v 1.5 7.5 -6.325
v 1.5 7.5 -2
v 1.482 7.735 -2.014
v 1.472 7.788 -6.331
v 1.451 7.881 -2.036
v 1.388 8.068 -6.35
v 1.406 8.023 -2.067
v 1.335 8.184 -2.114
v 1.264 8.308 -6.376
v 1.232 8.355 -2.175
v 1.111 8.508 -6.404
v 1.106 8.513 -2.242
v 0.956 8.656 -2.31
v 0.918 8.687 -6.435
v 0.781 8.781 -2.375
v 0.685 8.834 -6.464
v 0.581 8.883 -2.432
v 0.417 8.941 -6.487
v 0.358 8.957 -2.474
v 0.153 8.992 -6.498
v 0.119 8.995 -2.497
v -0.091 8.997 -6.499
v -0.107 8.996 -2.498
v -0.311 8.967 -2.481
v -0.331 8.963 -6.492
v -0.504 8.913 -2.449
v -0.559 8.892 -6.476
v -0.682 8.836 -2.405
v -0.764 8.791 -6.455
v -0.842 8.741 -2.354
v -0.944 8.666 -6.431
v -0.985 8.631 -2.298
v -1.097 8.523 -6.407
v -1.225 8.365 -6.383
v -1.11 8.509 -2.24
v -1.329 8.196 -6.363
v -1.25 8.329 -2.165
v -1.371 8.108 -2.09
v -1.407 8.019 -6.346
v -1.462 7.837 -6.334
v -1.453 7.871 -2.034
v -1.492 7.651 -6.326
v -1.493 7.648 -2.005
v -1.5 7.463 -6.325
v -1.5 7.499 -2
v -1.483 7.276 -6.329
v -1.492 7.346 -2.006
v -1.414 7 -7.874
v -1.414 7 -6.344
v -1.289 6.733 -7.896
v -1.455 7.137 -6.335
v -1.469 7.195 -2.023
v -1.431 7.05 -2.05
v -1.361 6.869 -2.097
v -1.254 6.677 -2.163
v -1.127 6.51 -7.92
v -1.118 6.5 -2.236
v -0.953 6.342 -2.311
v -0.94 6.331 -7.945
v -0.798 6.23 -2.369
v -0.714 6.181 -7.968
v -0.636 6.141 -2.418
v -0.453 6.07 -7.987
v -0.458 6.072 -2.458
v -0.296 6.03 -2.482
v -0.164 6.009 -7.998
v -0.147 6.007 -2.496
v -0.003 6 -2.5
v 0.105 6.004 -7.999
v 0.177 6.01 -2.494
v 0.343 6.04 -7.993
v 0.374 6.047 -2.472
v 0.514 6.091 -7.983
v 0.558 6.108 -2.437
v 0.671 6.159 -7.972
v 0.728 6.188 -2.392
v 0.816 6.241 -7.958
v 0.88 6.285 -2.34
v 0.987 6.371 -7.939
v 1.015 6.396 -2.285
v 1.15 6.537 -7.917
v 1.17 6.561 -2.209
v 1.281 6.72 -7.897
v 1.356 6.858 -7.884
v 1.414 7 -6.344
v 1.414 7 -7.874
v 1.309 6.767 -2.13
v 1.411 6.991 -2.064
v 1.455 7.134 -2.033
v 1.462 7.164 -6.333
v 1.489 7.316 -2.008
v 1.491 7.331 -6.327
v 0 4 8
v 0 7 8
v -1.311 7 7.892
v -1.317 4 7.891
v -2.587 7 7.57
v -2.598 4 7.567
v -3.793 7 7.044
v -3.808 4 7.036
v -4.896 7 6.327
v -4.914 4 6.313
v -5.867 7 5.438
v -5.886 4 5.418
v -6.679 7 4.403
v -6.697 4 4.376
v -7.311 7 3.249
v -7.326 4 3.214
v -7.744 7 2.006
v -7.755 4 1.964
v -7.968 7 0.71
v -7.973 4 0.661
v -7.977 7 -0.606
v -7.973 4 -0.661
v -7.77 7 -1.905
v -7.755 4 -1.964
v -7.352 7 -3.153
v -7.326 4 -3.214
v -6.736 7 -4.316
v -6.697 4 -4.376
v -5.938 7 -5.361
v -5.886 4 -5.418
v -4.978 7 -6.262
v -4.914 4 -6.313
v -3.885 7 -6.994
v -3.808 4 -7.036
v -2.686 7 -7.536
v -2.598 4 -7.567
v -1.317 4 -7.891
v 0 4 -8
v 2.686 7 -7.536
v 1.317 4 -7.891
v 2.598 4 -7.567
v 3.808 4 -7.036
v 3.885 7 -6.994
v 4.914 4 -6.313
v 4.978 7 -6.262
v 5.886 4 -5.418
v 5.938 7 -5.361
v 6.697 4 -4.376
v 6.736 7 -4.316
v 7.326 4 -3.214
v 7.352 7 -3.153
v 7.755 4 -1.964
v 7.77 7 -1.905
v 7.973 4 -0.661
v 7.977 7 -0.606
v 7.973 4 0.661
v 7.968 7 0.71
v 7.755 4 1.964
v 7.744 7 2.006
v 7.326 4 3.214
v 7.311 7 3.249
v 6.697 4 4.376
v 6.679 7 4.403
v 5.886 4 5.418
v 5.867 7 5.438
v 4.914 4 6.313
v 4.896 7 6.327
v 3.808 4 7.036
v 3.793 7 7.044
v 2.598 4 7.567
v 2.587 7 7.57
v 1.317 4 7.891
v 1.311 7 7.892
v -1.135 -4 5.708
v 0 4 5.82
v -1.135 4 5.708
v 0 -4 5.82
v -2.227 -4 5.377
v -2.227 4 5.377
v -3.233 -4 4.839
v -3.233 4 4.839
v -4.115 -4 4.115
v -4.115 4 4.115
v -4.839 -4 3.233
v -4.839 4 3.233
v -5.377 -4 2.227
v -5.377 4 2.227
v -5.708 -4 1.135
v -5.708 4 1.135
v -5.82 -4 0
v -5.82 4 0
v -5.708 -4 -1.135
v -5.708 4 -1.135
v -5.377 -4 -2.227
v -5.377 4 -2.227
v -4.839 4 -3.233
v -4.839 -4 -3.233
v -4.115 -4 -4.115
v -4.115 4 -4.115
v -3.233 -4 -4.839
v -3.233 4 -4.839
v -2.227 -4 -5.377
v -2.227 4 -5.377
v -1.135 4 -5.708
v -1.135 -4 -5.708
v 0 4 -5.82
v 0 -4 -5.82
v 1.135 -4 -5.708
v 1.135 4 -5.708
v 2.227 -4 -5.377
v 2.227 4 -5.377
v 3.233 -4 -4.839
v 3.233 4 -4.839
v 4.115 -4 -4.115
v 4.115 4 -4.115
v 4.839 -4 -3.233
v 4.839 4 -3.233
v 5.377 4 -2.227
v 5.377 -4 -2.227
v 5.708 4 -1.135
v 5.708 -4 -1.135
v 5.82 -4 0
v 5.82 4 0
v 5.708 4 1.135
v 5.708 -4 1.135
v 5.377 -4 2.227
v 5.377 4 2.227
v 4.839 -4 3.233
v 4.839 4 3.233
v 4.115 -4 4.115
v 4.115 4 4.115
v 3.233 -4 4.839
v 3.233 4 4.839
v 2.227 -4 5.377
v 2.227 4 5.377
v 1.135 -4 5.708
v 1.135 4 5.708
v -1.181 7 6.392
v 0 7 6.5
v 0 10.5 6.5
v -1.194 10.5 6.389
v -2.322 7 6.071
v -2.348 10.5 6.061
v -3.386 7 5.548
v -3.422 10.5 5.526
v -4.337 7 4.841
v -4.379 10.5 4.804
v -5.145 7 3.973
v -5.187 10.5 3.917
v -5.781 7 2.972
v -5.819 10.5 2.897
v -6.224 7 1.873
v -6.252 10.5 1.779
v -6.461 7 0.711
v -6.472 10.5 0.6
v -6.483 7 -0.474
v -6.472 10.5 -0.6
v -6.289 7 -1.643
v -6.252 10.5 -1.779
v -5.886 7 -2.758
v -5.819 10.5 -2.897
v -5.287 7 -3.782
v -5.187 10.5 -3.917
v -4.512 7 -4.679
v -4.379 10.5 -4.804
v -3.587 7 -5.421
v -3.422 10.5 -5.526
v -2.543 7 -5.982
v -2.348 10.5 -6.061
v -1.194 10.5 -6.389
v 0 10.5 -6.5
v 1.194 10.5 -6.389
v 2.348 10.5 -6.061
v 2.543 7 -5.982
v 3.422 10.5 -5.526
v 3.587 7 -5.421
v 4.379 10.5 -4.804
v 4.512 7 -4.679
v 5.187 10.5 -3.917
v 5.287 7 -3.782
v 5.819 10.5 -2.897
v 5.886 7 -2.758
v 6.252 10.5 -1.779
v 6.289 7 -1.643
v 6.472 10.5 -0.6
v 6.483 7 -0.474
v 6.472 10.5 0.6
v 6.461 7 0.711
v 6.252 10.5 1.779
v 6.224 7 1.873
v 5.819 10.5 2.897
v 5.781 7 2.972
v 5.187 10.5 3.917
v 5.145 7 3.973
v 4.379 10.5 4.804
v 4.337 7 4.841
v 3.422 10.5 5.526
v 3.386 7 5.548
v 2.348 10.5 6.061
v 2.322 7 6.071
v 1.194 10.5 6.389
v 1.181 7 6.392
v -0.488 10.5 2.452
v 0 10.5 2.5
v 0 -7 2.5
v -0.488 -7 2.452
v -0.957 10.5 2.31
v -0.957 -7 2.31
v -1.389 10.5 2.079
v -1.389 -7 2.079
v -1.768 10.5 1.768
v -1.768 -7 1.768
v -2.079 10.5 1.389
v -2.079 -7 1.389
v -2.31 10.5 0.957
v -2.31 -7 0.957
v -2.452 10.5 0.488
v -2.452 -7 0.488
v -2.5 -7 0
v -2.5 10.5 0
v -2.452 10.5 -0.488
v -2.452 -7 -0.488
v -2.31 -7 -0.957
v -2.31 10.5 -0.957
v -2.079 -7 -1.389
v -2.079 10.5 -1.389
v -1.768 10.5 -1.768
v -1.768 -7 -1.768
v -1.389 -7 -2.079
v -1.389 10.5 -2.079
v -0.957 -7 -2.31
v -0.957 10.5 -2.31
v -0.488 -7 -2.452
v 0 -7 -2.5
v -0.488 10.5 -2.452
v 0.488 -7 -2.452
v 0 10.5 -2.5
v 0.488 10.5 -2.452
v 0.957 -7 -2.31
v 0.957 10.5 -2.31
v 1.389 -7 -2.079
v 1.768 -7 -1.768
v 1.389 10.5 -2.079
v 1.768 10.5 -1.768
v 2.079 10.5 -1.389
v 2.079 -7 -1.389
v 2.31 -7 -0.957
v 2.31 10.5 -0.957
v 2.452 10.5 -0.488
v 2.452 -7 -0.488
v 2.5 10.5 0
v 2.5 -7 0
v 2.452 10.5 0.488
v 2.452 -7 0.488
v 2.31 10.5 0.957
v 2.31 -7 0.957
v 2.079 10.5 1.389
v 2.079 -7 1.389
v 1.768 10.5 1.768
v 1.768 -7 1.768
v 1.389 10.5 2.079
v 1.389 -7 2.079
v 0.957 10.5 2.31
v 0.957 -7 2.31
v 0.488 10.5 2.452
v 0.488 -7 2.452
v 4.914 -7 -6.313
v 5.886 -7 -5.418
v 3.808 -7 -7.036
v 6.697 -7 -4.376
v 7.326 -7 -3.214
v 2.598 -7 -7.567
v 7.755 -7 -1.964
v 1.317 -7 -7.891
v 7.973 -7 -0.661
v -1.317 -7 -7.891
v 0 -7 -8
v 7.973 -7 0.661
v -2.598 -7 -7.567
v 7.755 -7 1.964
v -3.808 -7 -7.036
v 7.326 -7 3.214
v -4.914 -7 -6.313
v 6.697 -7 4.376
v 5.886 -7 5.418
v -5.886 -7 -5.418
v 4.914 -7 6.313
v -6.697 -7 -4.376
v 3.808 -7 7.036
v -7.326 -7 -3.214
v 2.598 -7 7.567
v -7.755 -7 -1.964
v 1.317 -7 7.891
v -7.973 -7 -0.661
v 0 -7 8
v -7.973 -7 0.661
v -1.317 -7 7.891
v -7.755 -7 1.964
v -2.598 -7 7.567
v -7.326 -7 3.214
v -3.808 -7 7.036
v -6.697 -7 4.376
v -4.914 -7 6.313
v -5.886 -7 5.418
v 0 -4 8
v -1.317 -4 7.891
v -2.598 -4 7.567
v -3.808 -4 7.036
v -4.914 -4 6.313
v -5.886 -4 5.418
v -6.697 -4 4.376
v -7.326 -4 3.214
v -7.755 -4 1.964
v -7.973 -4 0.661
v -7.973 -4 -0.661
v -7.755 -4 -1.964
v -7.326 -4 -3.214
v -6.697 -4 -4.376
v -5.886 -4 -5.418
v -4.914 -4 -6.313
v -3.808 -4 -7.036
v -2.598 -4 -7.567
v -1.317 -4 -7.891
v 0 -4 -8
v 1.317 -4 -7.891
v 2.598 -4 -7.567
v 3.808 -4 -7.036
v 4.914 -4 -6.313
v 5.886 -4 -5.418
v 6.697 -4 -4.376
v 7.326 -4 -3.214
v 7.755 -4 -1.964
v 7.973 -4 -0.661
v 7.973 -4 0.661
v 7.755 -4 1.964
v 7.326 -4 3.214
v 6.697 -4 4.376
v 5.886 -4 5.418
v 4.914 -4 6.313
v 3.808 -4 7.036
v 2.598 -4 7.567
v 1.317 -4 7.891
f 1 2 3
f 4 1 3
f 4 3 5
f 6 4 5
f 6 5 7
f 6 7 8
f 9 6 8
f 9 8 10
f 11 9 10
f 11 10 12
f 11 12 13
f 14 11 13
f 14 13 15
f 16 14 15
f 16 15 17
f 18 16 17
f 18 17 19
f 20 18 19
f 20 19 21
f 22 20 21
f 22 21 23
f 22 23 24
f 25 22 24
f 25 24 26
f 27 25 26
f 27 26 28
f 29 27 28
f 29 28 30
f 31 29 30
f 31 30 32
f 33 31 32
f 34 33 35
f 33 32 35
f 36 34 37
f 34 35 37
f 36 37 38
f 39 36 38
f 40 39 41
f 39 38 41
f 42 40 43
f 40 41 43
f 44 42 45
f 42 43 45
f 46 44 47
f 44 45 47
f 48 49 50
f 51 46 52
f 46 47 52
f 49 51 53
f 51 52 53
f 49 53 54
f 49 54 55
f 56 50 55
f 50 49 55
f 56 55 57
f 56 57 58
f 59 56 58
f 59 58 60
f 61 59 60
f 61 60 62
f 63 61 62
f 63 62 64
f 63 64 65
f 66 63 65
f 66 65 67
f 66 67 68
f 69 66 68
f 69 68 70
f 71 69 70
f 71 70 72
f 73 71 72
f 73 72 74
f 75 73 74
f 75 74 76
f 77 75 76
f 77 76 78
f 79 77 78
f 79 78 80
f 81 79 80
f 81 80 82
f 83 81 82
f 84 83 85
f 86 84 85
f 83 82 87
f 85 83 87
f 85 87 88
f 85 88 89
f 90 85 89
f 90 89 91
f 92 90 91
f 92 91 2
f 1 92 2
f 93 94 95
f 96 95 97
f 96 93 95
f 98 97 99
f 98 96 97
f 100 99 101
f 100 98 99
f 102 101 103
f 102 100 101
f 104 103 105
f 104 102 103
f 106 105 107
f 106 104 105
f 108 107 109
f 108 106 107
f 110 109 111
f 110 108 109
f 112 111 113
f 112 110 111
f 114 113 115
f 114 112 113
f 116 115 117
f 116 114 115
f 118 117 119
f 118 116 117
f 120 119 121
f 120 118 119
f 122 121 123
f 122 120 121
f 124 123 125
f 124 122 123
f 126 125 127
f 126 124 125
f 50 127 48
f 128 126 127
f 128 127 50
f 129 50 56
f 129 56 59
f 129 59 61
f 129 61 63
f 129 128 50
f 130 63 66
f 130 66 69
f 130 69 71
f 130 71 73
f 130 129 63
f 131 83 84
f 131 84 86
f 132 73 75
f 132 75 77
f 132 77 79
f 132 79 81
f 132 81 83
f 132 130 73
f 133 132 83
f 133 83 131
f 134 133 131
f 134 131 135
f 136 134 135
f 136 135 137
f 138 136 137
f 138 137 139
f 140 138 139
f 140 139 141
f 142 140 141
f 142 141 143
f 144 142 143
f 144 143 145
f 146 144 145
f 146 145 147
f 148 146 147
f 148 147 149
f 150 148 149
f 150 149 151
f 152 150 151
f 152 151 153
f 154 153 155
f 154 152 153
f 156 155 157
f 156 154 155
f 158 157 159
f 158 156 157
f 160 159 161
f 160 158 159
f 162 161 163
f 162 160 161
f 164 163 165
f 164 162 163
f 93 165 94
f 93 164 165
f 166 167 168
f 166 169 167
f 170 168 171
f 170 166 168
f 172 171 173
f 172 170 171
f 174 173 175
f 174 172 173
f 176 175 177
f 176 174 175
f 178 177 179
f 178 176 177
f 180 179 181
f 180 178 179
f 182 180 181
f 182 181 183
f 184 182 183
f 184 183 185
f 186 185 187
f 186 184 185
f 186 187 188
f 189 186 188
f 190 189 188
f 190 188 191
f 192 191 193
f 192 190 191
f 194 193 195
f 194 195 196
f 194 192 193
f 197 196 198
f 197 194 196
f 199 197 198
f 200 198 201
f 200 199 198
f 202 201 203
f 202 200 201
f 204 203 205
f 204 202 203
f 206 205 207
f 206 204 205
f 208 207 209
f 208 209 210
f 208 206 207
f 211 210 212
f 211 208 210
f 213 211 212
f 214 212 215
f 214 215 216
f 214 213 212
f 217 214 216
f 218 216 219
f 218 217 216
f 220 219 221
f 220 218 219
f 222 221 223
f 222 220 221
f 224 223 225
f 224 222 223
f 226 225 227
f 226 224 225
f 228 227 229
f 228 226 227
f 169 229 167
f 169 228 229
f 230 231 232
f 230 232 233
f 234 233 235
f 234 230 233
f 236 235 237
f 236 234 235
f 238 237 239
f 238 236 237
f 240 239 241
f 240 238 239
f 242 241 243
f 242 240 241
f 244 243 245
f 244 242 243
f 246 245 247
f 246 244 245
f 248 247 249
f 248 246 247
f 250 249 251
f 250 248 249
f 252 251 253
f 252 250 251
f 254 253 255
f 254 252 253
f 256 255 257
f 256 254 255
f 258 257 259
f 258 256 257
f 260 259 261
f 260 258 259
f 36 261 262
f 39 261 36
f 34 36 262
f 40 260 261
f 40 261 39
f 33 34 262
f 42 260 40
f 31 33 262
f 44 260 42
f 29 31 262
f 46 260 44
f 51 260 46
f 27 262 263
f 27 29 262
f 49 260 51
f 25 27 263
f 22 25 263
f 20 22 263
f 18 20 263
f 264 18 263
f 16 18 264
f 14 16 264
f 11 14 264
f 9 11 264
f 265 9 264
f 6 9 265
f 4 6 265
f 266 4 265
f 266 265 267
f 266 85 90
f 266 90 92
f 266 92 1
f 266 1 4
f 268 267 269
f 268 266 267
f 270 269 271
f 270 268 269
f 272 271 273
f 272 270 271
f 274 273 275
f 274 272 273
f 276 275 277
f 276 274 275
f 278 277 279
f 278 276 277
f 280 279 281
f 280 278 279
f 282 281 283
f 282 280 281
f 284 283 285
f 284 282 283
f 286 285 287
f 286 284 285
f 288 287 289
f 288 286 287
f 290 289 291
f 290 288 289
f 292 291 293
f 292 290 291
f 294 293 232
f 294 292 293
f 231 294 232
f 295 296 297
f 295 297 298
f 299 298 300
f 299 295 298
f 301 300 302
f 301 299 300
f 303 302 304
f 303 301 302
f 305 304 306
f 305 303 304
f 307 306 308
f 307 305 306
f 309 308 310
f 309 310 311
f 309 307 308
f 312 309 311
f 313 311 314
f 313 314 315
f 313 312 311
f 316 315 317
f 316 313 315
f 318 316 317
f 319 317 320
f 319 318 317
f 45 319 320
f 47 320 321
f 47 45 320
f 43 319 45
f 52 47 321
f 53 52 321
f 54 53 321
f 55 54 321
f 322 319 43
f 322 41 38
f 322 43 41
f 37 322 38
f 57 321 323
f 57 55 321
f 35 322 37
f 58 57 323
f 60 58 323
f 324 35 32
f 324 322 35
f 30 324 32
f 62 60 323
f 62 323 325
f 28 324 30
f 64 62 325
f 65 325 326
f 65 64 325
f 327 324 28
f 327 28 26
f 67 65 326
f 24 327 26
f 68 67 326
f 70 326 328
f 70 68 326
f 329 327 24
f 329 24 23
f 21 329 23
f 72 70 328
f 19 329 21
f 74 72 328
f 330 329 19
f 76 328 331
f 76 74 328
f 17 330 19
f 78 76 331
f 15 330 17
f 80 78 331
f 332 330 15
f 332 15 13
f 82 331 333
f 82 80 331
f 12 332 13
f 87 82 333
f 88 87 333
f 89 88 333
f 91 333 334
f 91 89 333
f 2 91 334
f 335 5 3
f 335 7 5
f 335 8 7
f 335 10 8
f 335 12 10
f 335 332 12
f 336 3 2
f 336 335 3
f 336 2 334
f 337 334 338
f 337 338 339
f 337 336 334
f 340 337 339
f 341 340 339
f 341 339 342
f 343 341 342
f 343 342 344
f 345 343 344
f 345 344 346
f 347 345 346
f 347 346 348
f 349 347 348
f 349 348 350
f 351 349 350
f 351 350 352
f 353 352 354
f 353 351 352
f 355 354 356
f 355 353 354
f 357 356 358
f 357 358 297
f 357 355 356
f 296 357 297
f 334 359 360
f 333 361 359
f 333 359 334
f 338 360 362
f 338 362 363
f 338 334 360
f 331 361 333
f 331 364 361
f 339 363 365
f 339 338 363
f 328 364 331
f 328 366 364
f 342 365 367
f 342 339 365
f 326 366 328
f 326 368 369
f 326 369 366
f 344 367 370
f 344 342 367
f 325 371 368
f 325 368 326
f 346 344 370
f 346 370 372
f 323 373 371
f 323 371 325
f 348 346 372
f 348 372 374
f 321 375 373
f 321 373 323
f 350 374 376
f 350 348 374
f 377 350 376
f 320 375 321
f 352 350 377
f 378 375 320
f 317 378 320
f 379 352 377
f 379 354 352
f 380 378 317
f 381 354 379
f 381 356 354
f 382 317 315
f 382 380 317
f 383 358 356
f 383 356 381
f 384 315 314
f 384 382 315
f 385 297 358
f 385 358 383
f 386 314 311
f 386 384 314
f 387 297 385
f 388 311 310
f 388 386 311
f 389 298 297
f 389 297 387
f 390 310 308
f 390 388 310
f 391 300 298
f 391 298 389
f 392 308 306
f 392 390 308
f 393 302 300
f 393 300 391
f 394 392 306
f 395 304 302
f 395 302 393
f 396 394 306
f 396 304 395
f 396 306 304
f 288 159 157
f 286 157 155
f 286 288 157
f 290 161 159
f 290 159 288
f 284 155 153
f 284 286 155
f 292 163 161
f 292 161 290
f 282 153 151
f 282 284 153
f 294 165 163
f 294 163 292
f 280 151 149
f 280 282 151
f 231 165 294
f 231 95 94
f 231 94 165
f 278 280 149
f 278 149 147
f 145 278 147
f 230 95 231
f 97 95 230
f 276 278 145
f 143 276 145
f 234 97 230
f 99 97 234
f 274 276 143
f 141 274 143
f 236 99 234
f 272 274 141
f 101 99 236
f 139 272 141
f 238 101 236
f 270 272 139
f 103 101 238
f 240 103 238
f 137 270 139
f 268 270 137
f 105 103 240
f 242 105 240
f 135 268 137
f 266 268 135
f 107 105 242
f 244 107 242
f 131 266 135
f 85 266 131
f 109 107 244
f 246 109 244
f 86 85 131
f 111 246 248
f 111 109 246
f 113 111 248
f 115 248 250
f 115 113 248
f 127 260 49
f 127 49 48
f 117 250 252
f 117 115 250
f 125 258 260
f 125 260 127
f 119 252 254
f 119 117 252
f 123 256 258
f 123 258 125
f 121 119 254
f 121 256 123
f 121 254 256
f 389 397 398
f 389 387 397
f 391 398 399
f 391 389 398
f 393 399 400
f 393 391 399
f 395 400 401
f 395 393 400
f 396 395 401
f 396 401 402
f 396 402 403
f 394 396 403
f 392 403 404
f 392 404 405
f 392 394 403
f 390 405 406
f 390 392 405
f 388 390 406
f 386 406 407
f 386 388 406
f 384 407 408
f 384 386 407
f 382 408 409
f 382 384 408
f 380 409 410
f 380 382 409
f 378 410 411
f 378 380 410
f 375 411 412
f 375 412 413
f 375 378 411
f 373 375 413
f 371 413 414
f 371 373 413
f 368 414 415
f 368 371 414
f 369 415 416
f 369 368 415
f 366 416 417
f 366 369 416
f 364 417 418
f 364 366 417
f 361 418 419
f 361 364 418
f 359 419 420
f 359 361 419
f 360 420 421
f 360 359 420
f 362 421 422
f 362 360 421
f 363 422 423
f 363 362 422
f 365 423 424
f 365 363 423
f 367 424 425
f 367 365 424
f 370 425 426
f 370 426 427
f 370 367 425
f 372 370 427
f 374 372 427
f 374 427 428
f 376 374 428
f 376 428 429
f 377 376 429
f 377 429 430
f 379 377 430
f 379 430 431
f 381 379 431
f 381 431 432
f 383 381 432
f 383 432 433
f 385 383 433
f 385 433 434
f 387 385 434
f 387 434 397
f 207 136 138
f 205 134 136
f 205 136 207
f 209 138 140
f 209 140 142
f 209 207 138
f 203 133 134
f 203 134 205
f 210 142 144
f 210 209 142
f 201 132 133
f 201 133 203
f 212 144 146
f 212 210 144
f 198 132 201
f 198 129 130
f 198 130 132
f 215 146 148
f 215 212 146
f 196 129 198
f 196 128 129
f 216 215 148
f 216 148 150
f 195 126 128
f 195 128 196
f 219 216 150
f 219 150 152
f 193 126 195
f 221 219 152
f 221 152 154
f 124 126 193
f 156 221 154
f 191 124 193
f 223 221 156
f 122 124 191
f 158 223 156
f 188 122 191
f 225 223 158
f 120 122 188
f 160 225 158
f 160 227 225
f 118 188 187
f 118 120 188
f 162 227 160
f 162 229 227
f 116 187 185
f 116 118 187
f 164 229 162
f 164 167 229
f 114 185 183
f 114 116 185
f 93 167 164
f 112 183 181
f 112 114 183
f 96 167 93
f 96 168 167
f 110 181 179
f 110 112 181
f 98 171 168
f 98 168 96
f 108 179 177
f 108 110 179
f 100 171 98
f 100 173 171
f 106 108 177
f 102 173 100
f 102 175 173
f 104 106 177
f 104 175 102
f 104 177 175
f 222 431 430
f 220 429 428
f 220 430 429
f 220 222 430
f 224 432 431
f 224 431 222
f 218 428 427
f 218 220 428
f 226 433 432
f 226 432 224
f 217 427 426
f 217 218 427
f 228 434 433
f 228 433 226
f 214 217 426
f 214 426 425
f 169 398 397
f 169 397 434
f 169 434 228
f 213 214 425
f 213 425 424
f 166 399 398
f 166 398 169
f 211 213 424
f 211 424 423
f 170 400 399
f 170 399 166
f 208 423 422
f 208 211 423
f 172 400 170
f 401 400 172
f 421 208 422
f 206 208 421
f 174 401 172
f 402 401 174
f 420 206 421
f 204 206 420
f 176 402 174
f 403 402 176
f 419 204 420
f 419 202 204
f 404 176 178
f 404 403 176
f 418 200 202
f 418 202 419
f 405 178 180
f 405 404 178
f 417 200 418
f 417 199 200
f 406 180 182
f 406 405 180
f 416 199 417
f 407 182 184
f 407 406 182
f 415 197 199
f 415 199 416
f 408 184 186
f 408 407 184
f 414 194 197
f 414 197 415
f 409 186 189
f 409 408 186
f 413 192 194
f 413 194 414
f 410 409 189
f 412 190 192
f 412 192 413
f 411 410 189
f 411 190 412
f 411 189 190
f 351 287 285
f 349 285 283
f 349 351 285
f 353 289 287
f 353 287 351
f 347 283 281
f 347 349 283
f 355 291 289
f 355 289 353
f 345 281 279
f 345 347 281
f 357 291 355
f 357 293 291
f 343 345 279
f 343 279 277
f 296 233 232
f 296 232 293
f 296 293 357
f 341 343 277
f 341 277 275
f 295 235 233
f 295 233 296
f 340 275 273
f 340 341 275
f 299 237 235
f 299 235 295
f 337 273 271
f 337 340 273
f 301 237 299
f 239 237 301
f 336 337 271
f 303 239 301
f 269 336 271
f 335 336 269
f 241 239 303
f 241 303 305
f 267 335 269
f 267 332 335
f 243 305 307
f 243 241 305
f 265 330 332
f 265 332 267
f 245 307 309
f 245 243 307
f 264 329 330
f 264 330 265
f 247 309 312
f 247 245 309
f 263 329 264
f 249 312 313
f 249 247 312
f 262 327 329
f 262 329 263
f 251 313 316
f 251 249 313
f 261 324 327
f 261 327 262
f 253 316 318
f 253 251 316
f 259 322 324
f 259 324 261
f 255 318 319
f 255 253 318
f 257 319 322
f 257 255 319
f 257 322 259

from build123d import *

# Parameters (mm, degrees)
ESQUISSE2_R             = 1.5
ENL_V_MAT_EXTRU_1_DEPTH = 16.43534904


with BuildPart() as part:
    # Esquisse1 → Révolution1 (revolve)
    with BuildSketch(Plane.XY, mode=Mode.PRIVATE) as r_volution1_sk:
        Polygon((2.5, -7), (2.5, 10.5), (6.5, 10.5), (6.5, 7), (8, 7), (8, 4), (5.82, 4), (5.82, -4), (8, -4), (8, -7), align=None)
    revolve(r_volution1_sk.sketch.rotate(Axis((0, 5.91926869, 0), (0, -1, 0)), 90), axis=Axis((0, 5.91926869, 0), (0, -1, 0)))

    # Esquisse2 → Enlèv. mat.-Extru.1 (cut, through all)
    with BuildSketch(Plane.XY):
        with Locations((0, 7.5)):
            Circle(ESQUISSE2_R)
    extrude(amount=-ENL_V_MAT_EXTRU_1_DEPTH, mode=Mode.SUBTRACT)


solid = part.part
